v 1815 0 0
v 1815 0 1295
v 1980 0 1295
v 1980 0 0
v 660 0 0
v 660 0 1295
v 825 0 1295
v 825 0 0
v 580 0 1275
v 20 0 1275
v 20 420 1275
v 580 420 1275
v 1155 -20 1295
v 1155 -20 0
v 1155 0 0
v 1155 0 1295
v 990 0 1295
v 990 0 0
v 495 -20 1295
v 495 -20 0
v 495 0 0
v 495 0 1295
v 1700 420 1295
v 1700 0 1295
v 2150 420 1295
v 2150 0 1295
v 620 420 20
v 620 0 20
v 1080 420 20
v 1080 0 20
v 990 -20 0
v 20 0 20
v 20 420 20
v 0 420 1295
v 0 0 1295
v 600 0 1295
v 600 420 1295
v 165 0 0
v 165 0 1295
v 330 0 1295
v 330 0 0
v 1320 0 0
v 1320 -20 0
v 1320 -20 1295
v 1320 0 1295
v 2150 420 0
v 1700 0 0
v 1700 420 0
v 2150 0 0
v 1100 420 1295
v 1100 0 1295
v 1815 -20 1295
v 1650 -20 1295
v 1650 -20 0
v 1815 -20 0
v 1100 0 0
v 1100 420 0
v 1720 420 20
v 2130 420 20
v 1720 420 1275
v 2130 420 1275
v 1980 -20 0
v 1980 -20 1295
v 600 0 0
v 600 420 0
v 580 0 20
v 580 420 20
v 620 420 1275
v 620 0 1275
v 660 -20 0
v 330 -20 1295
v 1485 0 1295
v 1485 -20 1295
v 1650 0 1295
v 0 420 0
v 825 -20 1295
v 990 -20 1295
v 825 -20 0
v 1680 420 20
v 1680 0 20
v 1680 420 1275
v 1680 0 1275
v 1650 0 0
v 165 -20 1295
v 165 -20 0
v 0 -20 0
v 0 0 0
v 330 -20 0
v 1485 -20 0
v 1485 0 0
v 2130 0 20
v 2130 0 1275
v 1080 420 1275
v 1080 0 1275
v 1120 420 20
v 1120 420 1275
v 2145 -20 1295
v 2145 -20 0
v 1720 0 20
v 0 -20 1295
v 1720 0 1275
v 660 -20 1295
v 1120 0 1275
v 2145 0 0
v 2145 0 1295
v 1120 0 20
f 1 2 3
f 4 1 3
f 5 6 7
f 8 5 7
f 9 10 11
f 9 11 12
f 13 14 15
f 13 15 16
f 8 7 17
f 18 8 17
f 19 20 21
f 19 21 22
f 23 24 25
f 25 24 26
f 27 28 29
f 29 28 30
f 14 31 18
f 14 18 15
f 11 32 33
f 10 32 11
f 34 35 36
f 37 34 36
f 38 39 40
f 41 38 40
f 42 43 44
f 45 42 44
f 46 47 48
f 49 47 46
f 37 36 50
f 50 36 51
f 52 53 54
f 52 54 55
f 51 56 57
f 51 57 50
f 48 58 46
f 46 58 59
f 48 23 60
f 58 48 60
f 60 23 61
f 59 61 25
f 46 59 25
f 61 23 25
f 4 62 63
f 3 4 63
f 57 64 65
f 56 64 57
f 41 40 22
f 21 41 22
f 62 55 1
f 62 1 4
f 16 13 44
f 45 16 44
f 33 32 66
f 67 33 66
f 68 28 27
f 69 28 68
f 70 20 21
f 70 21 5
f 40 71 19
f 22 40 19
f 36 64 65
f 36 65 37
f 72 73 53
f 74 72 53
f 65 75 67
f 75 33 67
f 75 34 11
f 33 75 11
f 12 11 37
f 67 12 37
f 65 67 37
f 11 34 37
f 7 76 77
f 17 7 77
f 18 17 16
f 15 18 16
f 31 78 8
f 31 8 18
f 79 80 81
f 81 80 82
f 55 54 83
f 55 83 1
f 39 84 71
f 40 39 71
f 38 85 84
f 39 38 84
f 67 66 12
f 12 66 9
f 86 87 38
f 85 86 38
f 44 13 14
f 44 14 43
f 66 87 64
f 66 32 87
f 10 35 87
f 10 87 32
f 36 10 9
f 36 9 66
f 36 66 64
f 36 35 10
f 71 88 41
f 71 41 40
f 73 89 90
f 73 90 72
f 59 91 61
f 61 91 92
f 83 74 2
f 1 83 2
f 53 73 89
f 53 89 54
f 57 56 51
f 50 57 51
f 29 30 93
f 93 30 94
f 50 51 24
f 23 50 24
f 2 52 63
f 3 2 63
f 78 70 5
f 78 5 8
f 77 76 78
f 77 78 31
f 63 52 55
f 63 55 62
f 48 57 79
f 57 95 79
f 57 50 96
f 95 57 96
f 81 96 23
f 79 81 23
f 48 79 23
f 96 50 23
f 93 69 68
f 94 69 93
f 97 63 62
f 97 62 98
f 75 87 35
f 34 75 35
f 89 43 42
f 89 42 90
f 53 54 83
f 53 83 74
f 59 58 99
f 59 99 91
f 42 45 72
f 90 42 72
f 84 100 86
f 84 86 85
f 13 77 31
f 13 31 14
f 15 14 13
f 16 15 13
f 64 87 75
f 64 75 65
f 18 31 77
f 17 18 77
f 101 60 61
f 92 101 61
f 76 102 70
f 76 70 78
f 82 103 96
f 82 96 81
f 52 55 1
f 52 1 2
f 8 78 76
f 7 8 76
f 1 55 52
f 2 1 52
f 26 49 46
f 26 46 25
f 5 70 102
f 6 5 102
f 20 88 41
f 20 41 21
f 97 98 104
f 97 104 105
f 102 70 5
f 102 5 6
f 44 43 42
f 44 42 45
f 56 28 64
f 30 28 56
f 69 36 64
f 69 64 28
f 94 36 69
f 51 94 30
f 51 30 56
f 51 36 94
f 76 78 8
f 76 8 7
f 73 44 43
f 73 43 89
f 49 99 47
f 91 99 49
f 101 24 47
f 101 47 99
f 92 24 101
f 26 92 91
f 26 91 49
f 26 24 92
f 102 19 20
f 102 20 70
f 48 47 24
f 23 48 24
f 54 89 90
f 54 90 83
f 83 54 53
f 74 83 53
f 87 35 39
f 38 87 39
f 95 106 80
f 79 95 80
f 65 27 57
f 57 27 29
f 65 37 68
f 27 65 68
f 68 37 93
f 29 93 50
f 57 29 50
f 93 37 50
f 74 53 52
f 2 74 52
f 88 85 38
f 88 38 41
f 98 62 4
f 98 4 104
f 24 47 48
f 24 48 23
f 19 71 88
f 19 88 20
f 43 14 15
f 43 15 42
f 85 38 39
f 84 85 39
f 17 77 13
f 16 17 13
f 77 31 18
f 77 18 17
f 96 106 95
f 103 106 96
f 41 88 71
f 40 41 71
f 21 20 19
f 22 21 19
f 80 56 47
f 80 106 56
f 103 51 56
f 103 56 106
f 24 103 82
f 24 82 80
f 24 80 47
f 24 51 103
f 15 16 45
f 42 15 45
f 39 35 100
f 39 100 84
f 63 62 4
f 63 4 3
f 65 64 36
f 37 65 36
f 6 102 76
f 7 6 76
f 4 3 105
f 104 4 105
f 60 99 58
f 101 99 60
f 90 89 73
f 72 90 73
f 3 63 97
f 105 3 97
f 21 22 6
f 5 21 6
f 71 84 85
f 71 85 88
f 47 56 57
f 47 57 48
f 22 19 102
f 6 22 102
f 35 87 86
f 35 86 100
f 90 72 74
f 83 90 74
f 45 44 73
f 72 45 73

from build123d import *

# Parameters (mm, degrees)
F0_W      = 600
F0_H      = 1295
F0_W_2    = 560
F0_H_2    = 1255
F1_DEPTH  = 420
F2_W      = 500
F2_H      = 1295
F2_W_2    = 460
F2_H_2    = 1255
F3_DEPTH  = 420
F4_W      = 600
F4_H      = 1295
F4_W_2    = 560
F4_H_2    = 1255
F5_DEPTH  = 420
F6_W      = 450
F6_H      = 1295
F6_W_2    = 410
F6_H_2    = 1255
F7_DEPTH  = 420
F8_W      = 165
F8_H      = 1295
F9_DEPTH  = 20
F10_W     = 165
F10_H     = 1295
F11_DEPTH = 20
F12_W     = 165
F12_H     = 1295
F13_DEPTH = 20
F14_W     = 165
F14_H     = 1295
F15_DEPTH = 20
F16_W     = 165
F16_H     = 1295
F17_DEPTH = 20
F18_W     = 165
F18_H     = 1295
F19_DEPTH = 20
F20_W     = 165
F20_H     = 1295
F21_DEPTH = 20
F22_W     = 165
F22_H     = 1295
F23_DEPTH = 20
F24_W     = 165
F24_H     = 1295
F25_DEPTH = 20
F26_W     = 165
F26_H     = 1295
F27_DEPTH = 20
F28_W     = 165
F28_H     = 1295
F29_DEPTH = 20
F30_W     = 165
F30_H     = 1295
F31_DEPTH = 20
F32_W     = 165
F32_H     = 1295
F33_DEPTH = 20


with BuildPart() as f1:
    # F0 (on Front) → F1 (new body)
    with BuildSketch(Plane.XZ):
        with Locations((300, 647.5)):
            Rectangle(F0_W, F0_H)
        with Locations((300, 647.5)):
            Rectangle(F0_W_2, F0_H_2, mode=Mode.SUBTRACT)
    extrude(amount=-F1_DEPTH)


with BuildPart() as f3:
    # F2 (on face) → F3 (new body)
    with BuildSketch(Plane.XZ):
        with Locations((850, 647.5)):
            Rectangle(F2_W, F2_H)
        with Locations((850, 647.5)):
            Rectangle(F2_W_2, F2_H_2, mode=Mode.SUBTRACT)
    extrude(amount=-F3_DEPTH)


with BuildPart() as f5:
    # F4 (on face) → F5 (new body)
    with BuildSketch(Plane.XZ):
        with Locations((1400, 647.5)):
            Rectangle(F4_W, F4_H)
        with Locations((1400, 647.5)):
            Rectangle(F4_W_2, F4_H_2, mode=Mode.SUBTRACT)
    extrude(amount=-F5_DEPTH)


with BuildPart() as f7:
    # F6 (on face) → F7 (new body)
    with BuildSketch(Plane.XZ):
        with Locations((1925, 647.5)):
            Rectangle(F6_W, F6_H)
        with Locations((1925, 647.5)):
            Rectangle(F6_W_2, F6_H_2, mode=Mode.SUBTRACT)
    extrude(amount=-F7_DEPTH)


with BuildPart() as f9:
    # F8 (on face) → F9 (new body)
    with BuildSketch(Plane.XZ):
        with Locations((82.5, 647.5)):
            Rectangle(F8_W, F8_H)
    extrude(amount=F9_DEPTH)


with BuildPart() as f11:
    # F10 (on face) → F11 (new body)
    with BuildSketch(Plane.XZ.offset(20)):
        with Locations((247.5, 647.5)):
            Rectangle(F10_W, F10_H)
    extrude(amount=-F11_DEPTH)


with BuildPart() as f13:
    # F12 (on face) → F13 (new body)
    with BuildSketch(Plane.XZ.offset(20)):
        with Locations((412.5, 647.5)):
            Rectangle(F12_W, F12_H)
    extrude(amount=-F13_DEPTH)


with BuildPart() as f15:
    # F14 (on face) → F15 (new body)
    with BuildSketch(Plane.XZ.offset(20)):
        with Locations((577.5, 647.5)):
            Rectangle(F14_W, F14_H)
    extrude(amount=-F15_DEPTH)


with BuildPart() as f17:
    # F16 (on face) → F17 (new body)
    with BuildSketch(Plane.XZ.offset(20)):
        with Locations((742.5, 647.5)):
            Rectangle(F16_W, F16_H)
    extrude(amount=-F17_DEPTH)


with BuildPart() as f19:
    # F18 (on face) → F19 (new body)
    with BuildSketch(Plane.XZ.offset(20)):
        with Locations((907.5, 647.5)):
            Rectangle(F18_W, F18_H)
    extrude(amount=-F19_DEPTH)


with BuildPart() as f21:
    # F20 (on face) → F21 (new body)
    with BuildSketch(Plane.XZ.offset(20)):
        with Locations((1072.5, 647.5)):
            Rectangle(F20_W, F20_H)
    extrude(amount=-F21_DEPTH)


with BuildPart() as f23:
    # F22 (on face) → F23 (new body)
    with BuildSketch(Plane.XZ.offset(20)):
        with Locations((1237.5, 647.5)):
            Rectangle(F22_W, F22_H)
    extrude(amount=-F23_DEPTH)


with BuildPart() as f25:
    # F24 (on face) → F25 (new body)
    with BuildSketch(Plane.XZ.offset(20)):
        with Locations((1402.5, 647.5)):
            Rectangle(F24_W, F24_H)
    extrude(amount=-F25_DEPTH)


with BuildPart() as f27:
    # F26 (on face) → F27 (new body)
    with BuildSketch(Plane.XZ.offset(20)):
        with Locations((1567.5, 647.5)):
            Rectangle(F26_W, F26_H)
    extrude(amount=-F27_DEPTH)


with BuildPart() as f29:
    # F28 (on face) → F29 (new body)
    with BuildSketch(Plane.XZ.offset(20)):
        with Locations((1732.5, 647.5)):
            Rectangle(F28_W, F28_H)
    extrude(amount=-F29_DEPTH)


with BuildPart() as f31:
    # F30 (on face) → F31 (new body)
    with BuildSketch(Plane.XZ.offset(20)):
        with Locations((1897.5, 647.5)):
            Rectangle(F30_W, F30_H)
    extrude(amount=-F31_DEPTH)


with BuildPart() as f33:
    # F32 (on face) → F33 (new body)
    with BuildSketch(Plane.XZ.offset(20)):
        with Locations((2062.5, 647.5)):
            Rectangle(F32_W, F32_H)
    extrude(amount=-F33_DEPTH)


solid = Compound([f1.part, f3.part, f5.part, f7.part, f9.part, f11.part, f13.part, f15.part, f17.part, f19.part, f21.part, f23.part, f25.part, f27.part, f29.part, f31.part, f33.part])
